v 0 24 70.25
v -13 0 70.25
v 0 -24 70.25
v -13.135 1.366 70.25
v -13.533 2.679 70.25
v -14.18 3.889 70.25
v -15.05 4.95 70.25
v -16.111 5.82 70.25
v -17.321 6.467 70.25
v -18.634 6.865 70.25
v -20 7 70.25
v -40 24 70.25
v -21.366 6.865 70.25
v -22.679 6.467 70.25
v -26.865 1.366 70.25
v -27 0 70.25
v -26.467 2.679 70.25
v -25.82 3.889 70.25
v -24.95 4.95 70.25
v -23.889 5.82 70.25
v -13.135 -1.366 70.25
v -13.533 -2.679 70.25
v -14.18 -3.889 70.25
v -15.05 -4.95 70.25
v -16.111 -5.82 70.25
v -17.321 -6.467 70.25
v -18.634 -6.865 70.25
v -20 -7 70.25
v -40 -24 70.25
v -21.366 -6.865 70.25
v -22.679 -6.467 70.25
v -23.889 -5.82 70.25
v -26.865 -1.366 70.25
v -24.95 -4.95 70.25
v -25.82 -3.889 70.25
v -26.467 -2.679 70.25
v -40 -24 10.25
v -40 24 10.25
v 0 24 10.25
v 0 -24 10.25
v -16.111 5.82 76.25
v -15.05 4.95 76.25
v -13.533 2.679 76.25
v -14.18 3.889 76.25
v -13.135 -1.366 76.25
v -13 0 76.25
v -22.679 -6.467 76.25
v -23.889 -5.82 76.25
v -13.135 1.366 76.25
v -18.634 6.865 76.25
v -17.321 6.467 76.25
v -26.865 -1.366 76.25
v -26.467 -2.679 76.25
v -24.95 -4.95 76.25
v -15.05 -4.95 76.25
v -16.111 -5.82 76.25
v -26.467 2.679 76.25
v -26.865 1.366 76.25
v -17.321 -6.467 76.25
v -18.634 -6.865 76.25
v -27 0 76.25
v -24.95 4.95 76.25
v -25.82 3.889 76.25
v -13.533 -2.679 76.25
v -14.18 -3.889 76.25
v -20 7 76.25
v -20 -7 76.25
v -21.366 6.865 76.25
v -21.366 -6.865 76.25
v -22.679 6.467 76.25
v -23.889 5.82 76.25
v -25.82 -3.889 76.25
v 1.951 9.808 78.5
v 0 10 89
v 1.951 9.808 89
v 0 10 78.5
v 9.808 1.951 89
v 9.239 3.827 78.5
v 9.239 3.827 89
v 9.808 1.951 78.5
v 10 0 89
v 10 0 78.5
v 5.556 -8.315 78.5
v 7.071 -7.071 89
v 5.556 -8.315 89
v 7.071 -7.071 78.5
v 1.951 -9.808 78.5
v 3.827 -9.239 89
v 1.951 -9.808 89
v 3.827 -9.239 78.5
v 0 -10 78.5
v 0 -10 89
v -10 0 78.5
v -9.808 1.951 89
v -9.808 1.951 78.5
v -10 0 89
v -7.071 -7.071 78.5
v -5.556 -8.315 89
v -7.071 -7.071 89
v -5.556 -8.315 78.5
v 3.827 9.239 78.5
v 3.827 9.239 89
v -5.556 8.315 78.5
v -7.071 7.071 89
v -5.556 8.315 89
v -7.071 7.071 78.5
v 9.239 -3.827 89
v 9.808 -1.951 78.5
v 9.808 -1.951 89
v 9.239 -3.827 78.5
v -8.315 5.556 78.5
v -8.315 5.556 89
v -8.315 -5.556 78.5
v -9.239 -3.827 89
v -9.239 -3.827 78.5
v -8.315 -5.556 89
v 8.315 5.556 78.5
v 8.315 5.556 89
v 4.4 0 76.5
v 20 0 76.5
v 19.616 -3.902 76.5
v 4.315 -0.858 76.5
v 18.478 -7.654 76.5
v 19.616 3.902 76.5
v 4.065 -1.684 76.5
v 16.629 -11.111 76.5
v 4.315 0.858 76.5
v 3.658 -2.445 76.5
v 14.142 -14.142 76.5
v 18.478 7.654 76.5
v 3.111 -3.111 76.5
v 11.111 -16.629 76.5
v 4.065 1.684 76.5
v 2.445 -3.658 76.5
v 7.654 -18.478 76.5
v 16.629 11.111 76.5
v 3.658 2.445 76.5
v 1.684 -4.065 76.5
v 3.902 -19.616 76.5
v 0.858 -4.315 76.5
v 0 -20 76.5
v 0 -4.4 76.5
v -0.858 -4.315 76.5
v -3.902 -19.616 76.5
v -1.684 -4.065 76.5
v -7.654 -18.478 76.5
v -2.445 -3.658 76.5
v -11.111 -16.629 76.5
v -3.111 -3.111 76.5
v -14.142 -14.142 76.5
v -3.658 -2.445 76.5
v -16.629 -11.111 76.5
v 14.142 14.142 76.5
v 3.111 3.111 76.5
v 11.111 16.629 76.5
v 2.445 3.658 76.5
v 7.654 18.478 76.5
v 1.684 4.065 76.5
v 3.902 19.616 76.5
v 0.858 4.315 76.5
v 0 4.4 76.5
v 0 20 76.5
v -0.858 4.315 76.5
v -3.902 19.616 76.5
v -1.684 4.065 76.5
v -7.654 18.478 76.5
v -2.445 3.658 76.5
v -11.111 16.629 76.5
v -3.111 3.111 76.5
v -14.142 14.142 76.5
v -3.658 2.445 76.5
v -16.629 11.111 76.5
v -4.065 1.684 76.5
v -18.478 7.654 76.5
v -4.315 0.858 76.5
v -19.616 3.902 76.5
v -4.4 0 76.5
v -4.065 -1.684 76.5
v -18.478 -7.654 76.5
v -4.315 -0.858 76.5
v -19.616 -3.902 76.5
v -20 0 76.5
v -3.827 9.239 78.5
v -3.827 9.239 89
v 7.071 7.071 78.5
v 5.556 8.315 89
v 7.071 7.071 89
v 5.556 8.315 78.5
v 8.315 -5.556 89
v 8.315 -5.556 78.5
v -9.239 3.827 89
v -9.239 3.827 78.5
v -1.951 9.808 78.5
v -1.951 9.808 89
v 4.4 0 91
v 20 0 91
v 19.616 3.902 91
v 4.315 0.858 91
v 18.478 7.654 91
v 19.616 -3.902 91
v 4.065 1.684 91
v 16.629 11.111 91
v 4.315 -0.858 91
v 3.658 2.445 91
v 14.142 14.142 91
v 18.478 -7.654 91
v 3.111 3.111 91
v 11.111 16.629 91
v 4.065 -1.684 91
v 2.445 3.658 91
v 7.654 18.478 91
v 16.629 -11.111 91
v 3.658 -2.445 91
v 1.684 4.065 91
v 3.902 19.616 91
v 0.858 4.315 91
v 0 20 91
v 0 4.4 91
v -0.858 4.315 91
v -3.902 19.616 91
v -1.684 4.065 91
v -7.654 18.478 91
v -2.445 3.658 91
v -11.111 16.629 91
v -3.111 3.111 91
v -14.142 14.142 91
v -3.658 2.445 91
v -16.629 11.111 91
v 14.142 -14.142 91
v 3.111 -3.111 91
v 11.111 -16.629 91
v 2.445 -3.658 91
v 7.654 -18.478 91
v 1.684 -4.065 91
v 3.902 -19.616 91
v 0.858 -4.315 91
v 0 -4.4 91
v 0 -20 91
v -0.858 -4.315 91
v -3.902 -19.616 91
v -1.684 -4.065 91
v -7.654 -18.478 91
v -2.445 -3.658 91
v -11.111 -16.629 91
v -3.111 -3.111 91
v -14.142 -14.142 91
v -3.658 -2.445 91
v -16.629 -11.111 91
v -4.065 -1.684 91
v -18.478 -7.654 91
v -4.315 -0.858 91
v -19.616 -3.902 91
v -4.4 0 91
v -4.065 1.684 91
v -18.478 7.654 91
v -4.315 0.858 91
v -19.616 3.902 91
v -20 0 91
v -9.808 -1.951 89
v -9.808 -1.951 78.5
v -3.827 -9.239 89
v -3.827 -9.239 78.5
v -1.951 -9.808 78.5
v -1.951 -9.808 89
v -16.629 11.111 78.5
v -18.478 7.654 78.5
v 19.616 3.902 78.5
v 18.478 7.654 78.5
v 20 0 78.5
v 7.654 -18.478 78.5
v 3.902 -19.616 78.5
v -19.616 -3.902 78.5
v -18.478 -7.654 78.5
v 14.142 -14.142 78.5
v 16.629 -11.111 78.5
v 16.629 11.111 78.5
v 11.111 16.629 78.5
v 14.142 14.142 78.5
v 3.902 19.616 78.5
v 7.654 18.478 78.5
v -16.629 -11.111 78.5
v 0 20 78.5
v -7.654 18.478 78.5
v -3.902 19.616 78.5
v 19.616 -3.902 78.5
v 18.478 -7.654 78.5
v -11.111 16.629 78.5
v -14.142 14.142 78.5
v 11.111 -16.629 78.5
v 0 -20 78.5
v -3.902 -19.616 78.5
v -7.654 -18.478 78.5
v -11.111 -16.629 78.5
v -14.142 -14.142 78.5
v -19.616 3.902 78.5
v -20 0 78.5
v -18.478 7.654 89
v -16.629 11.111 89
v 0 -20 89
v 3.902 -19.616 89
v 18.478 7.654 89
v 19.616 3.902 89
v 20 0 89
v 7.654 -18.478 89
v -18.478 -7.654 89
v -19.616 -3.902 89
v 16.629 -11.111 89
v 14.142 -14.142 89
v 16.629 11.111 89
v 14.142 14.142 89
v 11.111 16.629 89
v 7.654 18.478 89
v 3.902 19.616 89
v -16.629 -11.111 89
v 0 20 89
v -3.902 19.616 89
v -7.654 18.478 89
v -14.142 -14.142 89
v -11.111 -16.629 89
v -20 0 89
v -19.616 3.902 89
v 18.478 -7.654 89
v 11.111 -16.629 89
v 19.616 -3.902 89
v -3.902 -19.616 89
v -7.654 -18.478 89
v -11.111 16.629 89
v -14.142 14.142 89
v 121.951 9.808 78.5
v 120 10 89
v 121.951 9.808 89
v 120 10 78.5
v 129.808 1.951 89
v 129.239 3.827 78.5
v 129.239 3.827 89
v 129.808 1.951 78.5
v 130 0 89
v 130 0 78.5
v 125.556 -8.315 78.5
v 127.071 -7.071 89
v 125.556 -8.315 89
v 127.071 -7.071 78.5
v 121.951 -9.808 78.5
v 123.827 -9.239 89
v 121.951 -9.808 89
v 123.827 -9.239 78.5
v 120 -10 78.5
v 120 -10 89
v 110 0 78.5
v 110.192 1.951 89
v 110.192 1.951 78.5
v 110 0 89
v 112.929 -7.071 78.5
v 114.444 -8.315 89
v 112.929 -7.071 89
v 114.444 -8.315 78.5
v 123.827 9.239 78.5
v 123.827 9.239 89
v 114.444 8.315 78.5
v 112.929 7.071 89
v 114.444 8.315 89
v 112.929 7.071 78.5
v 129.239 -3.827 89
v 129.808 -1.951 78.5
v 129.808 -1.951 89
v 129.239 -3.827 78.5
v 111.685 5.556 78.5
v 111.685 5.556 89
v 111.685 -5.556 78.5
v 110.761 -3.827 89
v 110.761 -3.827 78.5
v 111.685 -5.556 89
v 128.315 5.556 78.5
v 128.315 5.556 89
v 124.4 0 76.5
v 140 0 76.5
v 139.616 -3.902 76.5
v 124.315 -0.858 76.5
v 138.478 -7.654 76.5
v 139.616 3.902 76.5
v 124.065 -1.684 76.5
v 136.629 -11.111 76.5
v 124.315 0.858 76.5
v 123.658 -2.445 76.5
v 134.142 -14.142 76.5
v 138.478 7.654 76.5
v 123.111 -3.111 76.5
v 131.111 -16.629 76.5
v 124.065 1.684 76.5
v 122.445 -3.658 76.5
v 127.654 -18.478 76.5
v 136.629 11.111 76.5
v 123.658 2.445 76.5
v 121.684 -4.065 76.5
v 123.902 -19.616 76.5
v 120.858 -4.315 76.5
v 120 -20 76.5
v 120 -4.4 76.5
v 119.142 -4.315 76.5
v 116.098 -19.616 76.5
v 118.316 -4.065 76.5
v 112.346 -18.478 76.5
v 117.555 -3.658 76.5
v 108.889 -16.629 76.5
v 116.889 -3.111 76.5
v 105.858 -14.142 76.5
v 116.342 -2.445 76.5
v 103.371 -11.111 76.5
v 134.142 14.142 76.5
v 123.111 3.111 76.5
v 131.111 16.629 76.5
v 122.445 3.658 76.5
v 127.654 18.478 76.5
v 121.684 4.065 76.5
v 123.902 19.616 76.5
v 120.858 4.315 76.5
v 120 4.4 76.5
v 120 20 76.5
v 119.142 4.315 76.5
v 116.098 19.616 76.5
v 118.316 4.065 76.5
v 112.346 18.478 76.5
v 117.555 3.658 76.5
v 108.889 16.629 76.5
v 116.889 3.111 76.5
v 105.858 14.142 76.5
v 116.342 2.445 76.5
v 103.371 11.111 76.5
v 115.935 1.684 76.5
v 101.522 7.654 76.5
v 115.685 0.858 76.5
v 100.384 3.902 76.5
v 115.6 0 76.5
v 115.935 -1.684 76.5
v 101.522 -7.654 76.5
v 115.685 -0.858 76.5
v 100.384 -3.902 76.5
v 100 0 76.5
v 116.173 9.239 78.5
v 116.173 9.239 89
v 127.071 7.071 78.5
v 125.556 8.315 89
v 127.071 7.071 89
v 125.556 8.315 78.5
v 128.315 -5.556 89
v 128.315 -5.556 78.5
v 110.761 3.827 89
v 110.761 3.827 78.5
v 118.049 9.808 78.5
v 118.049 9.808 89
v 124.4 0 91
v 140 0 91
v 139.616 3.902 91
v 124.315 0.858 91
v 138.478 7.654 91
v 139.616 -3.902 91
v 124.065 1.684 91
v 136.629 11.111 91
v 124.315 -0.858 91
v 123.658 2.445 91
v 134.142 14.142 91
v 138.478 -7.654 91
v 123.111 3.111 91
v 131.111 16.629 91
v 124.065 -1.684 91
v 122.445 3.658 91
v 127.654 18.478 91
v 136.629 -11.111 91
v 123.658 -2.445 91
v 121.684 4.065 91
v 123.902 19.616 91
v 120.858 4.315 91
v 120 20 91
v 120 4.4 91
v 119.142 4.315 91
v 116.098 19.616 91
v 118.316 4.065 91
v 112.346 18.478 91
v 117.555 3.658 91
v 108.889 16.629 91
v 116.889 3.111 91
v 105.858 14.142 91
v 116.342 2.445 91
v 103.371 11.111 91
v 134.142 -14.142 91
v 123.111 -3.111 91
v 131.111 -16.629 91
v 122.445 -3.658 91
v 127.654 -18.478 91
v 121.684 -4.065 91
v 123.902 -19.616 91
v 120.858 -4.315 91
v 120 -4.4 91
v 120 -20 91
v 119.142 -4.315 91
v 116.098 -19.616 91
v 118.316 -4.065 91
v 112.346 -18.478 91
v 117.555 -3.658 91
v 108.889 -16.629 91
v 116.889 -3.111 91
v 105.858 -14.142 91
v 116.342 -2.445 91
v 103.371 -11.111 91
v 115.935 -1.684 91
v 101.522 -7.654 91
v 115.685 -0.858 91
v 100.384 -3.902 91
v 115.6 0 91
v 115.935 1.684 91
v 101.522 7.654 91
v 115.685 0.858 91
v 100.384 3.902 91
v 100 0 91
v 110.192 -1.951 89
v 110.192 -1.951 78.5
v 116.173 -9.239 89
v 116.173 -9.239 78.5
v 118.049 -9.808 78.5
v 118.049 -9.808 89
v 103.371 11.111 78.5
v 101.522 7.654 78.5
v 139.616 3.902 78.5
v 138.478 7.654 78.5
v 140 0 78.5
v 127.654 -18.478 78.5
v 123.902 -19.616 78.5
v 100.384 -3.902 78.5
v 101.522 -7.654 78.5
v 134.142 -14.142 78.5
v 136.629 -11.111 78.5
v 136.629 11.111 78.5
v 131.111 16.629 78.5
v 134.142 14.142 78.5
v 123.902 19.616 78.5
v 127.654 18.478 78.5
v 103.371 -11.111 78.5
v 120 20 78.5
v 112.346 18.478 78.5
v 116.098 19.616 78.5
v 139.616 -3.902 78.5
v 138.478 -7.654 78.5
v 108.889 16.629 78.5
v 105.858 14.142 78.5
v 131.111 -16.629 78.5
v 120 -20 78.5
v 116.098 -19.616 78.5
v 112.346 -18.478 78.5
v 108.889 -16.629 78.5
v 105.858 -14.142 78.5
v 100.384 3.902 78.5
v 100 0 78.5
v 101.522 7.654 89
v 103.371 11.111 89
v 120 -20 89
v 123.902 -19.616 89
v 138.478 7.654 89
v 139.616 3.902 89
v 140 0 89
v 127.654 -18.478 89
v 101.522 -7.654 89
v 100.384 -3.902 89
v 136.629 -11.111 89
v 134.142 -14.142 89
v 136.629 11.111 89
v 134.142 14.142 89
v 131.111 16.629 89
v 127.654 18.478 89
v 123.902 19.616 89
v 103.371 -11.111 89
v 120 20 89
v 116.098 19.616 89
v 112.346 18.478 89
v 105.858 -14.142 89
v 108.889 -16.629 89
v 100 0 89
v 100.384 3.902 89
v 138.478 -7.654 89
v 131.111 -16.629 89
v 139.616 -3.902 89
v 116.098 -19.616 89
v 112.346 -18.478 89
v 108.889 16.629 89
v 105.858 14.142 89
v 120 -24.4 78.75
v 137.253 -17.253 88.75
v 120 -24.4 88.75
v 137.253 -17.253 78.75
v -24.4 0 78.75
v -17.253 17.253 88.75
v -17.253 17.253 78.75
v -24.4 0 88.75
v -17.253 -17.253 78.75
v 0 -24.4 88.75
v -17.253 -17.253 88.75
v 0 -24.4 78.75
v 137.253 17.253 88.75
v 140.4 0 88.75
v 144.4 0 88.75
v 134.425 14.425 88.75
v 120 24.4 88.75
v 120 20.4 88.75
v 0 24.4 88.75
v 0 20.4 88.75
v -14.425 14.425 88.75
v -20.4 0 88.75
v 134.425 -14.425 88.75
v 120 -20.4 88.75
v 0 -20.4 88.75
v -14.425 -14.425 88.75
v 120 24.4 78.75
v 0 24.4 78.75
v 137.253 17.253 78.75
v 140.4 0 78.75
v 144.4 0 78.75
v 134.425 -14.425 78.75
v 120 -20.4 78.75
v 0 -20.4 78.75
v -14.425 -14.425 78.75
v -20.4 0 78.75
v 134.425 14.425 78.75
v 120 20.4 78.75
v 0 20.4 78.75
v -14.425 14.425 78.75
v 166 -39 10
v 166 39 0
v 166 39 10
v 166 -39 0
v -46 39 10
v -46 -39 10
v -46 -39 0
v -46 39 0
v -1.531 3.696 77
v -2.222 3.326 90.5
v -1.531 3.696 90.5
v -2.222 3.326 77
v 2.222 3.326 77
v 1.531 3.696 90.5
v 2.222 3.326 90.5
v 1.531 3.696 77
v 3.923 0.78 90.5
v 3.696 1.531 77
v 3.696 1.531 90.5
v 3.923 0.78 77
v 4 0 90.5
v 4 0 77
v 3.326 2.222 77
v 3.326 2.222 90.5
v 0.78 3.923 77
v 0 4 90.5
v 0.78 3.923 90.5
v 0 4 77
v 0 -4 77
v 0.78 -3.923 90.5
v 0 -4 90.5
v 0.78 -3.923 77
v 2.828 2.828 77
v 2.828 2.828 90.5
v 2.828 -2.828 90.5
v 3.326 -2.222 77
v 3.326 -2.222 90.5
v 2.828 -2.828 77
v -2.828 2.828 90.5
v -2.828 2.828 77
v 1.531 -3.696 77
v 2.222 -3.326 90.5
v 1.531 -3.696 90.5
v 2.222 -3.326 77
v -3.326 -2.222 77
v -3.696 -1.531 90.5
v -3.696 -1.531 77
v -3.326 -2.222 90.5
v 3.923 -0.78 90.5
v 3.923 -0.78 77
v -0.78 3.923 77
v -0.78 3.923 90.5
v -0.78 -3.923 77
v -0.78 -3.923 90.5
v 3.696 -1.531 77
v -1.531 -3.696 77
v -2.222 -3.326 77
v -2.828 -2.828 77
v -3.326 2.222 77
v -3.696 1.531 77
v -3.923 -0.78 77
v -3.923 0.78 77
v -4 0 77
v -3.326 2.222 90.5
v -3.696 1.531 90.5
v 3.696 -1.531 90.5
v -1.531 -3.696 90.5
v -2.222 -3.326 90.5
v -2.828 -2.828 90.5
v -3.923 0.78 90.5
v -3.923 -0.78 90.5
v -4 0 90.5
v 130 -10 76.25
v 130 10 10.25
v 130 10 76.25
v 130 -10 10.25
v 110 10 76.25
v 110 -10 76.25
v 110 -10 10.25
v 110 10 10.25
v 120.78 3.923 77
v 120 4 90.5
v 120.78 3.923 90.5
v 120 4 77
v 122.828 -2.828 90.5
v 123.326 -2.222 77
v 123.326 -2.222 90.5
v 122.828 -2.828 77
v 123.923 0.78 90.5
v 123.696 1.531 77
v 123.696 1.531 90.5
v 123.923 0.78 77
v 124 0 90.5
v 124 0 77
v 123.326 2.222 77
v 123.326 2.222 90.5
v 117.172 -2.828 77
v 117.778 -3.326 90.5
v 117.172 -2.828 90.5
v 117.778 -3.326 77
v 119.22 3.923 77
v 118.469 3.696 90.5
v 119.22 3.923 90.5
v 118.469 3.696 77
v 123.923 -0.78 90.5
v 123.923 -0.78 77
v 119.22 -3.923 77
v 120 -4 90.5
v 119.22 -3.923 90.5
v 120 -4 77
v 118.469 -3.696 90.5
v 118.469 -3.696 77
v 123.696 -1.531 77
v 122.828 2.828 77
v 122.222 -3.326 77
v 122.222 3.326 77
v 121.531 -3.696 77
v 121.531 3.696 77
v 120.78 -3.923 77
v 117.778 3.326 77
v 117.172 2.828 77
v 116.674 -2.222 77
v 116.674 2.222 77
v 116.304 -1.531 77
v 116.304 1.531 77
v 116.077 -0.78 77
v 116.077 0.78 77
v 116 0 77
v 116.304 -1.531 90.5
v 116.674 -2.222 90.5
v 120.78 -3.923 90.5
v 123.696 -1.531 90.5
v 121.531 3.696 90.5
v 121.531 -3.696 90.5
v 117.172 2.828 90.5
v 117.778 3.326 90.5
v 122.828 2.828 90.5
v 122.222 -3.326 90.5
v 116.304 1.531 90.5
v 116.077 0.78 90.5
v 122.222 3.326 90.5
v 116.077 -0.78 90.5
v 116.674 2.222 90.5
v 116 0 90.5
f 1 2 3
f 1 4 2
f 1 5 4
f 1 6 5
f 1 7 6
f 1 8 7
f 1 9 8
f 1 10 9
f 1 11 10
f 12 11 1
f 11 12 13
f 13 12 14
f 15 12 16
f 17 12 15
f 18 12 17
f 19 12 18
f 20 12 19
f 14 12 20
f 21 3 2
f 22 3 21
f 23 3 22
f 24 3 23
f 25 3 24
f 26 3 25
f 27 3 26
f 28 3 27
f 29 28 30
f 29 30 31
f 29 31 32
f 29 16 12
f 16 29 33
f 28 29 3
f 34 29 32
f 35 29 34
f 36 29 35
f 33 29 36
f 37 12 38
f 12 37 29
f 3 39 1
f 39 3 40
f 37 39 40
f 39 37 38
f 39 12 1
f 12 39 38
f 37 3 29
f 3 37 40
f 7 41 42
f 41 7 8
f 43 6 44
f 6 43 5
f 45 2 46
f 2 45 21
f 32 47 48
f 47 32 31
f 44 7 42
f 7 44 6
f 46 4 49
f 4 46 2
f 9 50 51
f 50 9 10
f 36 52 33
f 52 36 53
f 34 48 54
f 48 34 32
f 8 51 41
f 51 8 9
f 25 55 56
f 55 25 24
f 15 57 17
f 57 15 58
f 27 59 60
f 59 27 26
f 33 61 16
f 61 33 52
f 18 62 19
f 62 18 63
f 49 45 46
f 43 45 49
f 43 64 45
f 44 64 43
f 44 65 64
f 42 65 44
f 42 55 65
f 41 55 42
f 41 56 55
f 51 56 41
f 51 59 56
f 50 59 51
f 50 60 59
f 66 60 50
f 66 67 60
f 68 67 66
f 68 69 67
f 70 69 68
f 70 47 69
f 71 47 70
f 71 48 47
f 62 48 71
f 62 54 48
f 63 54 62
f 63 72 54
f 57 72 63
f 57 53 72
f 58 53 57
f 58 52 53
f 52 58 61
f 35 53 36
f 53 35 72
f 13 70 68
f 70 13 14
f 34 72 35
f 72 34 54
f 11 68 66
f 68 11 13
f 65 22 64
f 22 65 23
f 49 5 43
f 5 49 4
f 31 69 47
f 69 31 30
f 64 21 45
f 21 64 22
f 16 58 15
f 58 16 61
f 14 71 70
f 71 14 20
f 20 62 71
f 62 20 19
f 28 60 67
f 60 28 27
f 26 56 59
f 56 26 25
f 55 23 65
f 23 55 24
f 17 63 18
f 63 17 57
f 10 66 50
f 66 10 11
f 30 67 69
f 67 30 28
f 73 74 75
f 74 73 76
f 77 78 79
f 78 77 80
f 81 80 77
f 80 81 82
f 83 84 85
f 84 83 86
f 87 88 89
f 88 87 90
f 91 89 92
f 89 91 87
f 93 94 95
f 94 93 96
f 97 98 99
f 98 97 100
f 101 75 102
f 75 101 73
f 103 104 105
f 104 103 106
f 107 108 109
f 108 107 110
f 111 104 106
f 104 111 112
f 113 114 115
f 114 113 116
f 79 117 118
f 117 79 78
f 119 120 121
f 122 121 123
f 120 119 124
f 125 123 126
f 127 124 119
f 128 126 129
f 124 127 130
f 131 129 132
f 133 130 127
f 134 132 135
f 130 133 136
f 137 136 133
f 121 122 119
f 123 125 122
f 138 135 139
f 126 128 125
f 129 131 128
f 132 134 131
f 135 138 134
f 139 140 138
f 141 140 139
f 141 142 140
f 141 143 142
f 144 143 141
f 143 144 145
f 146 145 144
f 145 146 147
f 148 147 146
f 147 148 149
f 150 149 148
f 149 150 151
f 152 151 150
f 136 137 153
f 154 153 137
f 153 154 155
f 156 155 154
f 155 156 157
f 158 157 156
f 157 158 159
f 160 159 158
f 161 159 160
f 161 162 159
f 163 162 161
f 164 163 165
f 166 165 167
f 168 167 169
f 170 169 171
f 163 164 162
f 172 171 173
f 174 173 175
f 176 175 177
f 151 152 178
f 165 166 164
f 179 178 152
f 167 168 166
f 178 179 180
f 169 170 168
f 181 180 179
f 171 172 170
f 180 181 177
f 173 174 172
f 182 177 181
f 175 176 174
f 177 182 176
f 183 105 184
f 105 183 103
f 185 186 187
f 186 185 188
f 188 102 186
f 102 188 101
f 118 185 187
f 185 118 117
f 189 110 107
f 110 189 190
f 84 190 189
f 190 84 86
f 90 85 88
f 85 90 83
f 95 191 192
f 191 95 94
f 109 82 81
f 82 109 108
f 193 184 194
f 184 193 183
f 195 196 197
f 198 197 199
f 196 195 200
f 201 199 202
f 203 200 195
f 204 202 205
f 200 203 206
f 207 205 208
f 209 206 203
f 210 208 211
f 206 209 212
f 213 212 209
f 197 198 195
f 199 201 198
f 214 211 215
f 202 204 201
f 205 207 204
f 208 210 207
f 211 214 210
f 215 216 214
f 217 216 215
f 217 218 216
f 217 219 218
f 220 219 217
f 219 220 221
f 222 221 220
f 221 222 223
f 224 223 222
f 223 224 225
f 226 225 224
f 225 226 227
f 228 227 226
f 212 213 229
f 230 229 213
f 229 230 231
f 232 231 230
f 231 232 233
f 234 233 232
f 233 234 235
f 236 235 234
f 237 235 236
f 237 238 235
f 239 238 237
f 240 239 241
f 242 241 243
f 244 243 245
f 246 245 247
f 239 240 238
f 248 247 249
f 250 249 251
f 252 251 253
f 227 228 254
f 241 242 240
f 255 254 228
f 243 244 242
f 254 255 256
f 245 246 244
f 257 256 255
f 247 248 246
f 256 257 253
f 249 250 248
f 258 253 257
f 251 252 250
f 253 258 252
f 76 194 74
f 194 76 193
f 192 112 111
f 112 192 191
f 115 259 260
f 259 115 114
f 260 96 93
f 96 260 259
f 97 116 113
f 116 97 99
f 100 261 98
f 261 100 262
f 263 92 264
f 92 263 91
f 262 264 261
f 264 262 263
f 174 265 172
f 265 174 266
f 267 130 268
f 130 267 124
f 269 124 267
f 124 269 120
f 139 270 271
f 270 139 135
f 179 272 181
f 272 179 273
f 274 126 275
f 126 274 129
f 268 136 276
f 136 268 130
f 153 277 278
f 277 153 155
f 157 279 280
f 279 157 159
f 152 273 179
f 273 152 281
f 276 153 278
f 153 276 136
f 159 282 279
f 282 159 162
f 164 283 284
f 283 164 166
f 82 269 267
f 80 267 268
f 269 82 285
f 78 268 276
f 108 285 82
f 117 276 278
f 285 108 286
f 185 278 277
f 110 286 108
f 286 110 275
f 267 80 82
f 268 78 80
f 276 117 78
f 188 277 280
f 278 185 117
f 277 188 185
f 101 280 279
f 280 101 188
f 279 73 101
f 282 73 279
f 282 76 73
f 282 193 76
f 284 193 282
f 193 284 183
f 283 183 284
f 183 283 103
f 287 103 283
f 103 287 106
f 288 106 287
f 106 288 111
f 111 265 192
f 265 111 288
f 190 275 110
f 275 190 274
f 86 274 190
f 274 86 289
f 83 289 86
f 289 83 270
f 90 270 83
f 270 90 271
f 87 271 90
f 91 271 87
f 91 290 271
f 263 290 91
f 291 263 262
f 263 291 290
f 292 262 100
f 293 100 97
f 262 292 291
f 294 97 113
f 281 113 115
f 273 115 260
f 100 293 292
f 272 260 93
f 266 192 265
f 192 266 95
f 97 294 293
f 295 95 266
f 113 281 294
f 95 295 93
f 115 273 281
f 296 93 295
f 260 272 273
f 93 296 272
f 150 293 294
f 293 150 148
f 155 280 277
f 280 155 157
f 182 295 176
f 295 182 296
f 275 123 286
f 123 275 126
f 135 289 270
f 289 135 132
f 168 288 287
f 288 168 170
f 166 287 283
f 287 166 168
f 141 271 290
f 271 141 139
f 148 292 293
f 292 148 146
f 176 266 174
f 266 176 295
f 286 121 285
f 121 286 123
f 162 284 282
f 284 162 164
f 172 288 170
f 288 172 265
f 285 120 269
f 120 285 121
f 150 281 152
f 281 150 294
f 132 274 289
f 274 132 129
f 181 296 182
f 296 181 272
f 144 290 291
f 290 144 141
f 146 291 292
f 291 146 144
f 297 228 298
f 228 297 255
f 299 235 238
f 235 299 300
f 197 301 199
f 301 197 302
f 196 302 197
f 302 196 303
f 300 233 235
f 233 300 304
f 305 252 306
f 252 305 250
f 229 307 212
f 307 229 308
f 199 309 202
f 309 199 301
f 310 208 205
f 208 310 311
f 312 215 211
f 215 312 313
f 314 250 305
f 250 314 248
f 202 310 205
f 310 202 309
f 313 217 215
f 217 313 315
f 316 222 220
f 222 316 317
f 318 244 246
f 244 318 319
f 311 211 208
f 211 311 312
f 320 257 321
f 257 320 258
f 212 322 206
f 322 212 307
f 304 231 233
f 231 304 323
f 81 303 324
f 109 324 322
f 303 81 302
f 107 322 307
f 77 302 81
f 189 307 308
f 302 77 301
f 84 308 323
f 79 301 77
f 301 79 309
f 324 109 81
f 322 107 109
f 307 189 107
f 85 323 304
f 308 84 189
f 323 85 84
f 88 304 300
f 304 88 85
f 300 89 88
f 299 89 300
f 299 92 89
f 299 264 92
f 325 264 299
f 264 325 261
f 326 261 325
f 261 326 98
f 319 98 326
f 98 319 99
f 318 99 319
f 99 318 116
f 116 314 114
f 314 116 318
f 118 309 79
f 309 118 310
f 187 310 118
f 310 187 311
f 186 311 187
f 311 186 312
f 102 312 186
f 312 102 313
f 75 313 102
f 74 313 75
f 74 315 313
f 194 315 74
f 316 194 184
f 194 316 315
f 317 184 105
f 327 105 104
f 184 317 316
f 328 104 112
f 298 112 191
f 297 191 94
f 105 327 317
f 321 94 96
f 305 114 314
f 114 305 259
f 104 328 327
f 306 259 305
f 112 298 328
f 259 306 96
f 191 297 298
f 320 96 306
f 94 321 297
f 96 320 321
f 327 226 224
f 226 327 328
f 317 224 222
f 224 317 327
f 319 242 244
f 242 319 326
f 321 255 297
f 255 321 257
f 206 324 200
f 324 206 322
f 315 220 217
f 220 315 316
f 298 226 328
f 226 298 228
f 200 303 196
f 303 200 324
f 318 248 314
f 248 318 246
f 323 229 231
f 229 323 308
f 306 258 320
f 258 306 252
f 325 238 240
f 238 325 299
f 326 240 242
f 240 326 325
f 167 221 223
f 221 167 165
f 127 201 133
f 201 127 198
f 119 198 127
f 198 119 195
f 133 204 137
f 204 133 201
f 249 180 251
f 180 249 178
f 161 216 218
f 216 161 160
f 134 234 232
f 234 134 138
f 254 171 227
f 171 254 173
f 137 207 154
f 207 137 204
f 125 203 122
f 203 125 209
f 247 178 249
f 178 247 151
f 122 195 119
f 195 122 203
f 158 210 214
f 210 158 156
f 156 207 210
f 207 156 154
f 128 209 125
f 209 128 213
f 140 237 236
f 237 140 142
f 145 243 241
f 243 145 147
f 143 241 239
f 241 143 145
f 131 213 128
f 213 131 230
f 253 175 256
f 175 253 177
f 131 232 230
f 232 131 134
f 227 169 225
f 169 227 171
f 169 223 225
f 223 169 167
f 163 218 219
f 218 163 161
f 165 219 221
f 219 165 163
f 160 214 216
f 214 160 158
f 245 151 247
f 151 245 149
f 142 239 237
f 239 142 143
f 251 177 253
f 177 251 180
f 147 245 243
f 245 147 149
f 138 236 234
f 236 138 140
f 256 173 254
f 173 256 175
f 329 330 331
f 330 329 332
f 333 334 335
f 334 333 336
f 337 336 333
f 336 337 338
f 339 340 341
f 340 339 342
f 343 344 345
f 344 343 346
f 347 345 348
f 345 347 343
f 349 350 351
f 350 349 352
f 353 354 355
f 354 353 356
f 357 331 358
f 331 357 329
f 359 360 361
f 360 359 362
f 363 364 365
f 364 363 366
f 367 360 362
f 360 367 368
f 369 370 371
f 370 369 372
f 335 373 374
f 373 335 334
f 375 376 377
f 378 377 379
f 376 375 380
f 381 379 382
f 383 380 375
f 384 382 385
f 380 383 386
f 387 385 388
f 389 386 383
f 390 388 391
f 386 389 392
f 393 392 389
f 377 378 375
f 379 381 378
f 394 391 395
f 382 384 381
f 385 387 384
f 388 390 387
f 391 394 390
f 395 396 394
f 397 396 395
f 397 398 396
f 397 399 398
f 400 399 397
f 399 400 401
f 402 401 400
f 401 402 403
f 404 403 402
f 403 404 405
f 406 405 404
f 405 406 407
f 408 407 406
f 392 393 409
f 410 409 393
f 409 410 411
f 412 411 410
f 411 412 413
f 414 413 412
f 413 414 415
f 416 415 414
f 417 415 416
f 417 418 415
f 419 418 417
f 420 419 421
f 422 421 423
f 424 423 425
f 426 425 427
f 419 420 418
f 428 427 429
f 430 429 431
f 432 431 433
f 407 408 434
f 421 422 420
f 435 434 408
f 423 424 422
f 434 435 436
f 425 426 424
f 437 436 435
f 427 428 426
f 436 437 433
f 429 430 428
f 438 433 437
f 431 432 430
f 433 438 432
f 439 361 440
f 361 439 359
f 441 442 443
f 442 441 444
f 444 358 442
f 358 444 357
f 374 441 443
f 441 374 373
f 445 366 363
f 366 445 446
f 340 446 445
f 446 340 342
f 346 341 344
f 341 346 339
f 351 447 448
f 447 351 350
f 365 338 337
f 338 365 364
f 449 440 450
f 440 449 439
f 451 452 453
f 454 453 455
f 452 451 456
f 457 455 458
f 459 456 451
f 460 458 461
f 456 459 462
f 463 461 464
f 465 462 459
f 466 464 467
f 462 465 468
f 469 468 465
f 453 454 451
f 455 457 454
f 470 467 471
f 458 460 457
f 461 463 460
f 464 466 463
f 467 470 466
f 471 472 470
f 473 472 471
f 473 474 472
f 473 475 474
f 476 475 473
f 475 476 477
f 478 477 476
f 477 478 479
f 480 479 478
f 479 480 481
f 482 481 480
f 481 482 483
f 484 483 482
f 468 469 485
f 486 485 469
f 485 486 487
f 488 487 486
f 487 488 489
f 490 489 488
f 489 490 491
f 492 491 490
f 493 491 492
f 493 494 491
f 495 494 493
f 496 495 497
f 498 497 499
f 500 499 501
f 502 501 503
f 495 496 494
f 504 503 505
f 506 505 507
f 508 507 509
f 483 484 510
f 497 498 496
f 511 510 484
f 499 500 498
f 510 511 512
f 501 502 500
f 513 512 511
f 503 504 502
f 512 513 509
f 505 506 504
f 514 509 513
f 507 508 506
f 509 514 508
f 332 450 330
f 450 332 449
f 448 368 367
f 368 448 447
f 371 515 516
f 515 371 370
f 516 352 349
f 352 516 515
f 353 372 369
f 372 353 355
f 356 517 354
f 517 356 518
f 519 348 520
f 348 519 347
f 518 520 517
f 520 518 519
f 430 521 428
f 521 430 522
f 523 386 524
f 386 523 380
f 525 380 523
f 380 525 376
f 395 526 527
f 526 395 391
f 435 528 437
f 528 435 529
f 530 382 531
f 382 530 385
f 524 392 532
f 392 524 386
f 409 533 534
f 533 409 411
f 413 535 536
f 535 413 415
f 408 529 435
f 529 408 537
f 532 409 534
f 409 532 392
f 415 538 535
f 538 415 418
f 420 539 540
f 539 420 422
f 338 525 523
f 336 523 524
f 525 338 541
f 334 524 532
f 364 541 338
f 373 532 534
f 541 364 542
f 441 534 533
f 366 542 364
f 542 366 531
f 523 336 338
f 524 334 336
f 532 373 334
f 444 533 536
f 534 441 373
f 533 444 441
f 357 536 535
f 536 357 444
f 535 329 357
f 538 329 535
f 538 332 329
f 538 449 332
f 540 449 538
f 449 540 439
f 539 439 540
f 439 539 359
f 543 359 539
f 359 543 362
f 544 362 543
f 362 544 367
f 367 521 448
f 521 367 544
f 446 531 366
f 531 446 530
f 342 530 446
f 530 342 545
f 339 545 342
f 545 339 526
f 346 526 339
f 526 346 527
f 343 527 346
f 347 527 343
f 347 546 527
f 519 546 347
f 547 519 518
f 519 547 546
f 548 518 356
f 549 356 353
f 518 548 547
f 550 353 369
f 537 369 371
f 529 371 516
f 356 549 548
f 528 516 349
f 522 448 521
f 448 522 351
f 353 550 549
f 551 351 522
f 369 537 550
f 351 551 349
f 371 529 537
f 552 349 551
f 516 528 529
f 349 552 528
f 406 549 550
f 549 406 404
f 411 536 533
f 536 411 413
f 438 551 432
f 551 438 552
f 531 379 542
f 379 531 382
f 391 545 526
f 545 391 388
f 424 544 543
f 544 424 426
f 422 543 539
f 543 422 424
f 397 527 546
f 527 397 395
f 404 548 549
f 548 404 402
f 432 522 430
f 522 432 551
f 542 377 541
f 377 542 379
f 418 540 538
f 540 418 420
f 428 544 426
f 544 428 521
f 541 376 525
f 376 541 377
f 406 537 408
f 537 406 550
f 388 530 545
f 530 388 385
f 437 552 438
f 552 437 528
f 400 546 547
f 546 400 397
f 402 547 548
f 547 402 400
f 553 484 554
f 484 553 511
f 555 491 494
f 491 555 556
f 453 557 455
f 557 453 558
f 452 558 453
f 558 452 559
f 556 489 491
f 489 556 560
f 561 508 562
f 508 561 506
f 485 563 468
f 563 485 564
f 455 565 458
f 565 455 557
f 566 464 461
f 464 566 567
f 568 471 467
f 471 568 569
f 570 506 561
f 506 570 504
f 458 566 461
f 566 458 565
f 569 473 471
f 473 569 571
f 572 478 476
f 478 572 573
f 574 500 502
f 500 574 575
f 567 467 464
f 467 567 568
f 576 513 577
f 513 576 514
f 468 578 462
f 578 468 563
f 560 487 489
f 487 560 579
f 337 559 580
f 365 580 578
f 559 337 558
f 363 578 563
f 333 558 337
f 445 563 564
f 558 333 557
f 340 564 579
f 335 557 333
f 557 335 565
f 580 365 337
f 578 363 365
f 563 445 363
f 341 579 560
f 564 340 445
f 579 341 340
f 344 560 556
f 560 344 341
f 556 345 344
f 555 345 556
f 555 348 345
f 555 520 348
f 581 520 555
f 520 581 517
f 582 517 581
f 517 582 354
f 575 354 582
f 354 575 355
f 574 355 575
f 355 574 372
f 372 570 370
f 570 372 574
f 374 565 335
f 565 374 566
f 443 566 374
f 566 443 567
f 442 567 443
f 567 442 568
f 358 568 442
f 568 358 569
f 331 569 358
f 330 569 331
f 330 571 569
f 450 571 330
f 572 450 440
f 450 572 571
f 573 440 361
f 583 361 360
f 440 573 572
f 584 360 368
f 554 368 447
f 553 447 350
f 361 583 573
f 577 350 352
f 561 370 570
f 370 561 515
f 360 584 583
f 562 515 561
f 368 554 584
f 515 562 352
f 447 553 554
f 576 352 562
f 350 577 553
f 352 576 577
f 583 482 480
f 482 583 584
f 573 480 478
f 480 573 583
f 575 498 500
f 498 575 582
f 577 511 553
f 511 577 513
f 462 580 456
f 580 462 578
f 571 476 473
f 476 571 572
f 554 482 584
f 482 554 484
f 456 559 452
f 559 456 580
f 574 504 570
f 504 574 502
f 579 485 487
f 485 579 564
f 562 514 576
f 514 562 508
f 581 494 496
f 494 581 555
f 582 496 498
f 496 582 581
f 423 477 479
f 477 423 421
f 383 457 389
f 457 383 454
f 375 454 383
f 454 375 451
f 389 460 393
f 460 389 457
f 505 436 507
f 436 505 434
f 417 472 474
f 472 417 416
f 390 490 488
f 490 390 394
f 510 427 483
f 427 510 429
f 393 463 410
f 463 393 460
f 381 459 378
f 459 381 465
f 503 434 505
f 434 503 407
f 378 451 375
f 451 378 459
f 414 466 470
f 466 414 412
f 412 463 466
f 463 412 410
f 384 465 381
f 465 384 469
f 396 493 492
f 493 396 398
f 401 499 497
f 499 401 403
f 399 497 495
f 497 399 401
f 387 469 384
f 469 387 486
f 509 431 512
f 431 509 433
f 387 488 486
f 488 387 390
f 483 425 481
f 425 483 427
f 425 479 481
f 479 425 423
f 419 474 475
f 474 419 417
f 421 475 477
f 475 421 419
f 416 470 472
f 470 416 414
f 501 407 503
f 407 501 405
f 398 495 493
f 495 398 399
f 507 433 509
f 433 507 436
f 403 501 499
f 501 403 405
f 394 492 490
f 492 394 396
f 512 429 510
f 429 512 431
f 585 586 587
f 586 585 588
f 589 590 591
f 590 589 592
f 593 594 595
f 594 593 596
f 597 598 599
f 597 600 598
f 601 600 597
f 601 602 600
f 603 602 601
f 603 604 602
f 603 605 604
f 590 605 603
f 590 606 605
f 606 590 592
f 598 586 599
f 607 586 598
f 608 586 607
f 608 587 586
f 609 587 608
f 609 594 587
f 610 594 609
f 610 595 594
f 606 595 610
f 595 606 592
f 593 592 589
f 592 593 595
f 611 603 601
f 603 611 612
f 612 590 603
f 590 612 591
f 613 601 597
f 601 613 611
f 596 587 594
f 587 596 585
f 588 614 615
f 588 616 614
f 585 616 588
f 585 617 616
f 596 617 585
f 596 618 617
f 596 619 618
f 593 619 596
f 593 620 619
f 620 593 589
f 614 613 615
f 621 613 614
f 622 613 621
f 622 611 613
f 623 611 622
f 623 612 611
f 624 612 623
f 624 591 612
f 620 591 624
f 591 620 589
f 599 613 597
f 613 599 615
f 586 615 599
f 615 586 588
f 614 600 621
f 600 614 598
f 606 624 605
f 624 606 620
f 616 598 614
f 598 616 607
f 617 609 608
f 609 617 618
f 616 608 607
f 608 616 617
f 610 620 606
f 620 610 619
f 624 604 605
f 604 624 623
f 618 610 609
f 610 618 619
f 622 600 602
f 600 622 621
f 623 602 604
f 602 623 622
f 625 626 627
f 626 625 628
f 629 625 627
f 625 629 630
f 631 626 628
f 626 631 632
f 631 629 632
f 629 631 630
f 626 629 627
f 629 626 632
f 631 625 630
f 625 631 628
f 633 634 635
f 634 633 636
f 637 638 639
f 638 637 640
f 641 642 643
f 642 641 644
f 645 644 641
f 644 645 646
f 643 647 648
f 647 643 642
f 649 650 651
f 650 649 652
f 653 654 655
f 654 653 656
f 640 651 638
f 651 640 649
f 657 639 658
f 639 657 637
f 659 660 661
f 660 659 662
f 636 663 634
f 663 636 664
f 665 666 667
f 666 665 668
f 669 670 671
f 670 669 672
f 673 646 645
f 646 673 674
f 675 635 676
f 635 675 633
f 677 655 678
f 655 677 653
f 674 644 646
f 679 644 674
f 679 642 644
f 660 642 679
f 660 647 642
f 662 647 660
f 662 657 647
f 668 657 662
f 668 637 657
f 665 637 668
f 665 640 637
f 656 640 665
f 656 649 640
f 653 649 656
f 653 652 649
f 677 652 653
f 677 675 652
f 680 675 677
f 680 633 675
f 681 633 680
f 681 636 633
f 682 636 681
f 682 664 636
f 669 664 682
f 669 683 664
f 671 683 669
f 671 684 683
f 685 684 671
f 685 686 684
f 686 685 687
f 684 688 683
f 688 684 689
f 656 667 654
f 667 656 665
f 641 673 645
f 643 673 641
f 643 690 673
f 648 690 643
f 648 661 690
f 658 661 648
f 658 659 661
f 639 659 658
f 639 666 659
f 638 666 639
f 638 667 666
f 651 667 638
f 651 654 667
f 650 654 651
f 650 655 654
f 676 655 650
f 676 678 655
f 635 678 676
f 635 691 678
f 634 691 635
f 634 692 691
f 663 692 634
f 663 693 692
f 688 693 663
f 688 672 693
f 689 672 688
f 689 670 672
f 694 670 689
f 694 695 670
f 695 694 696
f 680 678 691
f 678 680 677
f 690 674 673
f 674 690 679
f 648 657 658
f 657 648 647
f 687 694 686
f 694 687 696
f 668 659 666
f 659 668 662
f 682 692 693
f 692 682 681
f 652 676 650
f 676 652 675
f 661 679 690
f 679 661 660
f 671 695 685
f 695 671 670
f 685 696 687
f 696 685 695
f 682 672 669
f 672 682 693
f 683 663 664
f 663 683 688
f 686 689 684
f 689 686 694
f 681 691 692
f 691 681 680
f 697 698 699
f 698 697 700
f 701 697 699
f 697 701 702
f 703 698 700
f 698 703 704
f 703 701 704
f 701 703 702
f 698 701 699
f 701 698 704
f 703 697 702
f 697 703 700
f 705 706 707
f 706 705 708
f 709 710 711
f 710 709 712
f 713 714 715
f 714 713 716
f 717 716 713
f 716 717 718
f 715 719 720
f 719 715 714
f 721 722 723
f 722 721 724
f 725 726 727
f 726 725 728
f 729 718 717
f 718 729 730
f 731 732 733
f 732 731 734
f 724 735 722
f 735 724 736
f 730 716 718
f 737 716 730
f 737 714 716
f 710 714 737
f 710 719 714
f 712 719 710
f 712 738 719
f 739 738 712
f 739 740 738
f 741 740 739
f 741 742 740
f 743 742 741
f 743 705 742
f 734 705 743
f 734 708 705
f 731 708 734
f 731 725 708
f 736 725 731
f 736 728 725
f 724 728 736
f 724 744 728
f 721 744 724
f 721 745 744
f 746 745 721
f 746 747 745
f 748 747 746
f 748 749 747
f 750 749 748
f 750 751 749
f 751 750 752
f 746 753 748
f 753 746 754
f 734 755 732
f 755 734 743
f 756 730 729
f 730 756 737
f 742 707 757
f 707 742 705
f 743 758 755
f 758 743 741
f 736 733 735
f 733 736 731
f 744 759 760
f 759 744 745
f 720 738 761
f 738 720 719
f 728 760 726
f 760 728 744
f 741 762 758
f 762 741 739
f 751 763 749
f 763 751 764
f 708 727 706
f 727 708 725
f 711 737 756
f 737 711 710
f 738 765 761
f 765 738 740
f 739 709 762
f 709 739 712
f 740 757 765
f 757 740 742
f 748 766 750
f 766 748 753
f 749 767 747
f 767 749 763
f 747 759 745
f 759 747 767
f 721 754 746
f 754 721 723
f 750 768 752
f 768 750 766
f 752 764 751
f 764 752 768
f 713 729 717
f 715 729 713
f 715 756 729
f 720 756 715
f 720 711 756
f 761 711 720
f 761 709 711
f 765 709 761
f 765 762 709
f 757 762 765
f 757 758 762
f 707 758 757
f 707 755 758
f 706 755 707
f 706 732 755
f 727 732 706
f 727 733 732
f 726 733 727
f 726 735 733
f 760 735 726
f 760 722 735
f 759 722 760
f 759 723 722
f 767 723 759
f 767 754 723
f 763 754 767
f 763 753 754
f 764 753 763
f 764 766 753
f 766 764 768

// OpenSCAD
$fn = 32;

// ------------------------------------------------------------------------
// Motor belt drive: span 120 mm, pulleys d40, belt 10 mm wide
// Every part is its own module, assembly() places every instance.
// ------------------------------------------------------------------------

// --- part 1 ---
module base_plate() {
  difference() {
    translate([-106, -39, 0]) cube([212, 78, 10]);
  }
}

// --- part 2 ---
module motor() {
  union() {
    translate([-30, -24, 0]) cube([60, 48, 40]);
    translate([33, 0, 20]) rotate([0, 90, 0]) cylinder(h = 6, d = 14, center = true);
  }
}

// --- part 3 ---
module drive_shaft() {
  translate([0, 0, -6.75]) cylinder(h = 13.5, d = 8);
}

// --- part 4 ---
module pulley_drive() {
  difference() {
    union() {
      cylinder(h = 14.5, d = 20);
      cylinder(h = 2, d = 40);
      translate([0, 0, 12.5]) cylinder(h = 2, d = 40);
    }
    translate([0, 0, -1]) cylinder(h = 16.5, d = 8.8);
  }
}

// --- part 5 ---
module idler_post() {
  translate([-10, -10, 0]) cube([20, 20, 66]);
}

// --- part 6 ---
module driven_shaft() {
  translate([0, 0, -6.75]) cylinder(h = 13.5, d = 8);
}

// --- part 7 ---
module pulley_driven() {
  difference() {
    union() {
      cylinder(h = 14.5, d = 20);
      cylinder(h = 2, d = 40);
      translate([0, 0, 12.5]) cylinder(h = 2, d = 40);
    }
    translate([0, 0, -1]) cylinder(h = 16.5, d = 8.8);
  }
}

// --- part 8 ---
module drive_belt() {
  difference() {
    linear_extrude(height = 10) polygon(points = concat([for (a = [90 : 45 : 270]) [24.4 * cos(a), 24.4 * sin(a)]], [for (a = [270 : 45 : 450]) [120 + 24.4 * cos(a), 24.4 * sin(a)]]));
    translate([0, 0, -1]) linear_extrude(height = 12) polygon(points = concat([for (a = [90 : 45 : 270]) [20.4 * cos(a), 20.4 * sin(a)]], [for (a = [270 : 45 : 450]) [120 + 20.4 * cos(a), 20.4 * sin(a)]]));
  }
}

// --- assembly ---
module assembly() {
  color([0.80, 0.24, 0.20]) translate([60, 0, 0]) rotate([0, 0, 0]) base_plate();
  color([0.20, 0.45, 0.75]) translate([0, 0, 40.25]) rotate([0, 270, 0]) motor();
  color([0.25, 0.62, 0.32]) translate([0, 0, 83.75]) rotate([0, 0, 0]) drive_shaft();
  color([0.92, 0.70, 0.18]) translate([0, 0, 76.5]) rotate([0, 0, 0]) pulley_drive();
  color([0.58, 0.35, 0.70]) translate([120, 0, 10.25]) rotate([0, 0, 0]) idler_post();
  color([0.16, 0.66, 0.66]) translate([120, 0, 83.75]) rotate([0, 0, 0]) driven_shaft();
  color([0.85, 0.48, 0.18]) translate([120, 0, 76.5]) rotate([0, 0, 0]) pulley_driven();
  color([0.55, 0.60, 0.65]) translate([0, 0, 78.75]) rotate([0, 0, 0]) drive_belt();
}

assembly();
